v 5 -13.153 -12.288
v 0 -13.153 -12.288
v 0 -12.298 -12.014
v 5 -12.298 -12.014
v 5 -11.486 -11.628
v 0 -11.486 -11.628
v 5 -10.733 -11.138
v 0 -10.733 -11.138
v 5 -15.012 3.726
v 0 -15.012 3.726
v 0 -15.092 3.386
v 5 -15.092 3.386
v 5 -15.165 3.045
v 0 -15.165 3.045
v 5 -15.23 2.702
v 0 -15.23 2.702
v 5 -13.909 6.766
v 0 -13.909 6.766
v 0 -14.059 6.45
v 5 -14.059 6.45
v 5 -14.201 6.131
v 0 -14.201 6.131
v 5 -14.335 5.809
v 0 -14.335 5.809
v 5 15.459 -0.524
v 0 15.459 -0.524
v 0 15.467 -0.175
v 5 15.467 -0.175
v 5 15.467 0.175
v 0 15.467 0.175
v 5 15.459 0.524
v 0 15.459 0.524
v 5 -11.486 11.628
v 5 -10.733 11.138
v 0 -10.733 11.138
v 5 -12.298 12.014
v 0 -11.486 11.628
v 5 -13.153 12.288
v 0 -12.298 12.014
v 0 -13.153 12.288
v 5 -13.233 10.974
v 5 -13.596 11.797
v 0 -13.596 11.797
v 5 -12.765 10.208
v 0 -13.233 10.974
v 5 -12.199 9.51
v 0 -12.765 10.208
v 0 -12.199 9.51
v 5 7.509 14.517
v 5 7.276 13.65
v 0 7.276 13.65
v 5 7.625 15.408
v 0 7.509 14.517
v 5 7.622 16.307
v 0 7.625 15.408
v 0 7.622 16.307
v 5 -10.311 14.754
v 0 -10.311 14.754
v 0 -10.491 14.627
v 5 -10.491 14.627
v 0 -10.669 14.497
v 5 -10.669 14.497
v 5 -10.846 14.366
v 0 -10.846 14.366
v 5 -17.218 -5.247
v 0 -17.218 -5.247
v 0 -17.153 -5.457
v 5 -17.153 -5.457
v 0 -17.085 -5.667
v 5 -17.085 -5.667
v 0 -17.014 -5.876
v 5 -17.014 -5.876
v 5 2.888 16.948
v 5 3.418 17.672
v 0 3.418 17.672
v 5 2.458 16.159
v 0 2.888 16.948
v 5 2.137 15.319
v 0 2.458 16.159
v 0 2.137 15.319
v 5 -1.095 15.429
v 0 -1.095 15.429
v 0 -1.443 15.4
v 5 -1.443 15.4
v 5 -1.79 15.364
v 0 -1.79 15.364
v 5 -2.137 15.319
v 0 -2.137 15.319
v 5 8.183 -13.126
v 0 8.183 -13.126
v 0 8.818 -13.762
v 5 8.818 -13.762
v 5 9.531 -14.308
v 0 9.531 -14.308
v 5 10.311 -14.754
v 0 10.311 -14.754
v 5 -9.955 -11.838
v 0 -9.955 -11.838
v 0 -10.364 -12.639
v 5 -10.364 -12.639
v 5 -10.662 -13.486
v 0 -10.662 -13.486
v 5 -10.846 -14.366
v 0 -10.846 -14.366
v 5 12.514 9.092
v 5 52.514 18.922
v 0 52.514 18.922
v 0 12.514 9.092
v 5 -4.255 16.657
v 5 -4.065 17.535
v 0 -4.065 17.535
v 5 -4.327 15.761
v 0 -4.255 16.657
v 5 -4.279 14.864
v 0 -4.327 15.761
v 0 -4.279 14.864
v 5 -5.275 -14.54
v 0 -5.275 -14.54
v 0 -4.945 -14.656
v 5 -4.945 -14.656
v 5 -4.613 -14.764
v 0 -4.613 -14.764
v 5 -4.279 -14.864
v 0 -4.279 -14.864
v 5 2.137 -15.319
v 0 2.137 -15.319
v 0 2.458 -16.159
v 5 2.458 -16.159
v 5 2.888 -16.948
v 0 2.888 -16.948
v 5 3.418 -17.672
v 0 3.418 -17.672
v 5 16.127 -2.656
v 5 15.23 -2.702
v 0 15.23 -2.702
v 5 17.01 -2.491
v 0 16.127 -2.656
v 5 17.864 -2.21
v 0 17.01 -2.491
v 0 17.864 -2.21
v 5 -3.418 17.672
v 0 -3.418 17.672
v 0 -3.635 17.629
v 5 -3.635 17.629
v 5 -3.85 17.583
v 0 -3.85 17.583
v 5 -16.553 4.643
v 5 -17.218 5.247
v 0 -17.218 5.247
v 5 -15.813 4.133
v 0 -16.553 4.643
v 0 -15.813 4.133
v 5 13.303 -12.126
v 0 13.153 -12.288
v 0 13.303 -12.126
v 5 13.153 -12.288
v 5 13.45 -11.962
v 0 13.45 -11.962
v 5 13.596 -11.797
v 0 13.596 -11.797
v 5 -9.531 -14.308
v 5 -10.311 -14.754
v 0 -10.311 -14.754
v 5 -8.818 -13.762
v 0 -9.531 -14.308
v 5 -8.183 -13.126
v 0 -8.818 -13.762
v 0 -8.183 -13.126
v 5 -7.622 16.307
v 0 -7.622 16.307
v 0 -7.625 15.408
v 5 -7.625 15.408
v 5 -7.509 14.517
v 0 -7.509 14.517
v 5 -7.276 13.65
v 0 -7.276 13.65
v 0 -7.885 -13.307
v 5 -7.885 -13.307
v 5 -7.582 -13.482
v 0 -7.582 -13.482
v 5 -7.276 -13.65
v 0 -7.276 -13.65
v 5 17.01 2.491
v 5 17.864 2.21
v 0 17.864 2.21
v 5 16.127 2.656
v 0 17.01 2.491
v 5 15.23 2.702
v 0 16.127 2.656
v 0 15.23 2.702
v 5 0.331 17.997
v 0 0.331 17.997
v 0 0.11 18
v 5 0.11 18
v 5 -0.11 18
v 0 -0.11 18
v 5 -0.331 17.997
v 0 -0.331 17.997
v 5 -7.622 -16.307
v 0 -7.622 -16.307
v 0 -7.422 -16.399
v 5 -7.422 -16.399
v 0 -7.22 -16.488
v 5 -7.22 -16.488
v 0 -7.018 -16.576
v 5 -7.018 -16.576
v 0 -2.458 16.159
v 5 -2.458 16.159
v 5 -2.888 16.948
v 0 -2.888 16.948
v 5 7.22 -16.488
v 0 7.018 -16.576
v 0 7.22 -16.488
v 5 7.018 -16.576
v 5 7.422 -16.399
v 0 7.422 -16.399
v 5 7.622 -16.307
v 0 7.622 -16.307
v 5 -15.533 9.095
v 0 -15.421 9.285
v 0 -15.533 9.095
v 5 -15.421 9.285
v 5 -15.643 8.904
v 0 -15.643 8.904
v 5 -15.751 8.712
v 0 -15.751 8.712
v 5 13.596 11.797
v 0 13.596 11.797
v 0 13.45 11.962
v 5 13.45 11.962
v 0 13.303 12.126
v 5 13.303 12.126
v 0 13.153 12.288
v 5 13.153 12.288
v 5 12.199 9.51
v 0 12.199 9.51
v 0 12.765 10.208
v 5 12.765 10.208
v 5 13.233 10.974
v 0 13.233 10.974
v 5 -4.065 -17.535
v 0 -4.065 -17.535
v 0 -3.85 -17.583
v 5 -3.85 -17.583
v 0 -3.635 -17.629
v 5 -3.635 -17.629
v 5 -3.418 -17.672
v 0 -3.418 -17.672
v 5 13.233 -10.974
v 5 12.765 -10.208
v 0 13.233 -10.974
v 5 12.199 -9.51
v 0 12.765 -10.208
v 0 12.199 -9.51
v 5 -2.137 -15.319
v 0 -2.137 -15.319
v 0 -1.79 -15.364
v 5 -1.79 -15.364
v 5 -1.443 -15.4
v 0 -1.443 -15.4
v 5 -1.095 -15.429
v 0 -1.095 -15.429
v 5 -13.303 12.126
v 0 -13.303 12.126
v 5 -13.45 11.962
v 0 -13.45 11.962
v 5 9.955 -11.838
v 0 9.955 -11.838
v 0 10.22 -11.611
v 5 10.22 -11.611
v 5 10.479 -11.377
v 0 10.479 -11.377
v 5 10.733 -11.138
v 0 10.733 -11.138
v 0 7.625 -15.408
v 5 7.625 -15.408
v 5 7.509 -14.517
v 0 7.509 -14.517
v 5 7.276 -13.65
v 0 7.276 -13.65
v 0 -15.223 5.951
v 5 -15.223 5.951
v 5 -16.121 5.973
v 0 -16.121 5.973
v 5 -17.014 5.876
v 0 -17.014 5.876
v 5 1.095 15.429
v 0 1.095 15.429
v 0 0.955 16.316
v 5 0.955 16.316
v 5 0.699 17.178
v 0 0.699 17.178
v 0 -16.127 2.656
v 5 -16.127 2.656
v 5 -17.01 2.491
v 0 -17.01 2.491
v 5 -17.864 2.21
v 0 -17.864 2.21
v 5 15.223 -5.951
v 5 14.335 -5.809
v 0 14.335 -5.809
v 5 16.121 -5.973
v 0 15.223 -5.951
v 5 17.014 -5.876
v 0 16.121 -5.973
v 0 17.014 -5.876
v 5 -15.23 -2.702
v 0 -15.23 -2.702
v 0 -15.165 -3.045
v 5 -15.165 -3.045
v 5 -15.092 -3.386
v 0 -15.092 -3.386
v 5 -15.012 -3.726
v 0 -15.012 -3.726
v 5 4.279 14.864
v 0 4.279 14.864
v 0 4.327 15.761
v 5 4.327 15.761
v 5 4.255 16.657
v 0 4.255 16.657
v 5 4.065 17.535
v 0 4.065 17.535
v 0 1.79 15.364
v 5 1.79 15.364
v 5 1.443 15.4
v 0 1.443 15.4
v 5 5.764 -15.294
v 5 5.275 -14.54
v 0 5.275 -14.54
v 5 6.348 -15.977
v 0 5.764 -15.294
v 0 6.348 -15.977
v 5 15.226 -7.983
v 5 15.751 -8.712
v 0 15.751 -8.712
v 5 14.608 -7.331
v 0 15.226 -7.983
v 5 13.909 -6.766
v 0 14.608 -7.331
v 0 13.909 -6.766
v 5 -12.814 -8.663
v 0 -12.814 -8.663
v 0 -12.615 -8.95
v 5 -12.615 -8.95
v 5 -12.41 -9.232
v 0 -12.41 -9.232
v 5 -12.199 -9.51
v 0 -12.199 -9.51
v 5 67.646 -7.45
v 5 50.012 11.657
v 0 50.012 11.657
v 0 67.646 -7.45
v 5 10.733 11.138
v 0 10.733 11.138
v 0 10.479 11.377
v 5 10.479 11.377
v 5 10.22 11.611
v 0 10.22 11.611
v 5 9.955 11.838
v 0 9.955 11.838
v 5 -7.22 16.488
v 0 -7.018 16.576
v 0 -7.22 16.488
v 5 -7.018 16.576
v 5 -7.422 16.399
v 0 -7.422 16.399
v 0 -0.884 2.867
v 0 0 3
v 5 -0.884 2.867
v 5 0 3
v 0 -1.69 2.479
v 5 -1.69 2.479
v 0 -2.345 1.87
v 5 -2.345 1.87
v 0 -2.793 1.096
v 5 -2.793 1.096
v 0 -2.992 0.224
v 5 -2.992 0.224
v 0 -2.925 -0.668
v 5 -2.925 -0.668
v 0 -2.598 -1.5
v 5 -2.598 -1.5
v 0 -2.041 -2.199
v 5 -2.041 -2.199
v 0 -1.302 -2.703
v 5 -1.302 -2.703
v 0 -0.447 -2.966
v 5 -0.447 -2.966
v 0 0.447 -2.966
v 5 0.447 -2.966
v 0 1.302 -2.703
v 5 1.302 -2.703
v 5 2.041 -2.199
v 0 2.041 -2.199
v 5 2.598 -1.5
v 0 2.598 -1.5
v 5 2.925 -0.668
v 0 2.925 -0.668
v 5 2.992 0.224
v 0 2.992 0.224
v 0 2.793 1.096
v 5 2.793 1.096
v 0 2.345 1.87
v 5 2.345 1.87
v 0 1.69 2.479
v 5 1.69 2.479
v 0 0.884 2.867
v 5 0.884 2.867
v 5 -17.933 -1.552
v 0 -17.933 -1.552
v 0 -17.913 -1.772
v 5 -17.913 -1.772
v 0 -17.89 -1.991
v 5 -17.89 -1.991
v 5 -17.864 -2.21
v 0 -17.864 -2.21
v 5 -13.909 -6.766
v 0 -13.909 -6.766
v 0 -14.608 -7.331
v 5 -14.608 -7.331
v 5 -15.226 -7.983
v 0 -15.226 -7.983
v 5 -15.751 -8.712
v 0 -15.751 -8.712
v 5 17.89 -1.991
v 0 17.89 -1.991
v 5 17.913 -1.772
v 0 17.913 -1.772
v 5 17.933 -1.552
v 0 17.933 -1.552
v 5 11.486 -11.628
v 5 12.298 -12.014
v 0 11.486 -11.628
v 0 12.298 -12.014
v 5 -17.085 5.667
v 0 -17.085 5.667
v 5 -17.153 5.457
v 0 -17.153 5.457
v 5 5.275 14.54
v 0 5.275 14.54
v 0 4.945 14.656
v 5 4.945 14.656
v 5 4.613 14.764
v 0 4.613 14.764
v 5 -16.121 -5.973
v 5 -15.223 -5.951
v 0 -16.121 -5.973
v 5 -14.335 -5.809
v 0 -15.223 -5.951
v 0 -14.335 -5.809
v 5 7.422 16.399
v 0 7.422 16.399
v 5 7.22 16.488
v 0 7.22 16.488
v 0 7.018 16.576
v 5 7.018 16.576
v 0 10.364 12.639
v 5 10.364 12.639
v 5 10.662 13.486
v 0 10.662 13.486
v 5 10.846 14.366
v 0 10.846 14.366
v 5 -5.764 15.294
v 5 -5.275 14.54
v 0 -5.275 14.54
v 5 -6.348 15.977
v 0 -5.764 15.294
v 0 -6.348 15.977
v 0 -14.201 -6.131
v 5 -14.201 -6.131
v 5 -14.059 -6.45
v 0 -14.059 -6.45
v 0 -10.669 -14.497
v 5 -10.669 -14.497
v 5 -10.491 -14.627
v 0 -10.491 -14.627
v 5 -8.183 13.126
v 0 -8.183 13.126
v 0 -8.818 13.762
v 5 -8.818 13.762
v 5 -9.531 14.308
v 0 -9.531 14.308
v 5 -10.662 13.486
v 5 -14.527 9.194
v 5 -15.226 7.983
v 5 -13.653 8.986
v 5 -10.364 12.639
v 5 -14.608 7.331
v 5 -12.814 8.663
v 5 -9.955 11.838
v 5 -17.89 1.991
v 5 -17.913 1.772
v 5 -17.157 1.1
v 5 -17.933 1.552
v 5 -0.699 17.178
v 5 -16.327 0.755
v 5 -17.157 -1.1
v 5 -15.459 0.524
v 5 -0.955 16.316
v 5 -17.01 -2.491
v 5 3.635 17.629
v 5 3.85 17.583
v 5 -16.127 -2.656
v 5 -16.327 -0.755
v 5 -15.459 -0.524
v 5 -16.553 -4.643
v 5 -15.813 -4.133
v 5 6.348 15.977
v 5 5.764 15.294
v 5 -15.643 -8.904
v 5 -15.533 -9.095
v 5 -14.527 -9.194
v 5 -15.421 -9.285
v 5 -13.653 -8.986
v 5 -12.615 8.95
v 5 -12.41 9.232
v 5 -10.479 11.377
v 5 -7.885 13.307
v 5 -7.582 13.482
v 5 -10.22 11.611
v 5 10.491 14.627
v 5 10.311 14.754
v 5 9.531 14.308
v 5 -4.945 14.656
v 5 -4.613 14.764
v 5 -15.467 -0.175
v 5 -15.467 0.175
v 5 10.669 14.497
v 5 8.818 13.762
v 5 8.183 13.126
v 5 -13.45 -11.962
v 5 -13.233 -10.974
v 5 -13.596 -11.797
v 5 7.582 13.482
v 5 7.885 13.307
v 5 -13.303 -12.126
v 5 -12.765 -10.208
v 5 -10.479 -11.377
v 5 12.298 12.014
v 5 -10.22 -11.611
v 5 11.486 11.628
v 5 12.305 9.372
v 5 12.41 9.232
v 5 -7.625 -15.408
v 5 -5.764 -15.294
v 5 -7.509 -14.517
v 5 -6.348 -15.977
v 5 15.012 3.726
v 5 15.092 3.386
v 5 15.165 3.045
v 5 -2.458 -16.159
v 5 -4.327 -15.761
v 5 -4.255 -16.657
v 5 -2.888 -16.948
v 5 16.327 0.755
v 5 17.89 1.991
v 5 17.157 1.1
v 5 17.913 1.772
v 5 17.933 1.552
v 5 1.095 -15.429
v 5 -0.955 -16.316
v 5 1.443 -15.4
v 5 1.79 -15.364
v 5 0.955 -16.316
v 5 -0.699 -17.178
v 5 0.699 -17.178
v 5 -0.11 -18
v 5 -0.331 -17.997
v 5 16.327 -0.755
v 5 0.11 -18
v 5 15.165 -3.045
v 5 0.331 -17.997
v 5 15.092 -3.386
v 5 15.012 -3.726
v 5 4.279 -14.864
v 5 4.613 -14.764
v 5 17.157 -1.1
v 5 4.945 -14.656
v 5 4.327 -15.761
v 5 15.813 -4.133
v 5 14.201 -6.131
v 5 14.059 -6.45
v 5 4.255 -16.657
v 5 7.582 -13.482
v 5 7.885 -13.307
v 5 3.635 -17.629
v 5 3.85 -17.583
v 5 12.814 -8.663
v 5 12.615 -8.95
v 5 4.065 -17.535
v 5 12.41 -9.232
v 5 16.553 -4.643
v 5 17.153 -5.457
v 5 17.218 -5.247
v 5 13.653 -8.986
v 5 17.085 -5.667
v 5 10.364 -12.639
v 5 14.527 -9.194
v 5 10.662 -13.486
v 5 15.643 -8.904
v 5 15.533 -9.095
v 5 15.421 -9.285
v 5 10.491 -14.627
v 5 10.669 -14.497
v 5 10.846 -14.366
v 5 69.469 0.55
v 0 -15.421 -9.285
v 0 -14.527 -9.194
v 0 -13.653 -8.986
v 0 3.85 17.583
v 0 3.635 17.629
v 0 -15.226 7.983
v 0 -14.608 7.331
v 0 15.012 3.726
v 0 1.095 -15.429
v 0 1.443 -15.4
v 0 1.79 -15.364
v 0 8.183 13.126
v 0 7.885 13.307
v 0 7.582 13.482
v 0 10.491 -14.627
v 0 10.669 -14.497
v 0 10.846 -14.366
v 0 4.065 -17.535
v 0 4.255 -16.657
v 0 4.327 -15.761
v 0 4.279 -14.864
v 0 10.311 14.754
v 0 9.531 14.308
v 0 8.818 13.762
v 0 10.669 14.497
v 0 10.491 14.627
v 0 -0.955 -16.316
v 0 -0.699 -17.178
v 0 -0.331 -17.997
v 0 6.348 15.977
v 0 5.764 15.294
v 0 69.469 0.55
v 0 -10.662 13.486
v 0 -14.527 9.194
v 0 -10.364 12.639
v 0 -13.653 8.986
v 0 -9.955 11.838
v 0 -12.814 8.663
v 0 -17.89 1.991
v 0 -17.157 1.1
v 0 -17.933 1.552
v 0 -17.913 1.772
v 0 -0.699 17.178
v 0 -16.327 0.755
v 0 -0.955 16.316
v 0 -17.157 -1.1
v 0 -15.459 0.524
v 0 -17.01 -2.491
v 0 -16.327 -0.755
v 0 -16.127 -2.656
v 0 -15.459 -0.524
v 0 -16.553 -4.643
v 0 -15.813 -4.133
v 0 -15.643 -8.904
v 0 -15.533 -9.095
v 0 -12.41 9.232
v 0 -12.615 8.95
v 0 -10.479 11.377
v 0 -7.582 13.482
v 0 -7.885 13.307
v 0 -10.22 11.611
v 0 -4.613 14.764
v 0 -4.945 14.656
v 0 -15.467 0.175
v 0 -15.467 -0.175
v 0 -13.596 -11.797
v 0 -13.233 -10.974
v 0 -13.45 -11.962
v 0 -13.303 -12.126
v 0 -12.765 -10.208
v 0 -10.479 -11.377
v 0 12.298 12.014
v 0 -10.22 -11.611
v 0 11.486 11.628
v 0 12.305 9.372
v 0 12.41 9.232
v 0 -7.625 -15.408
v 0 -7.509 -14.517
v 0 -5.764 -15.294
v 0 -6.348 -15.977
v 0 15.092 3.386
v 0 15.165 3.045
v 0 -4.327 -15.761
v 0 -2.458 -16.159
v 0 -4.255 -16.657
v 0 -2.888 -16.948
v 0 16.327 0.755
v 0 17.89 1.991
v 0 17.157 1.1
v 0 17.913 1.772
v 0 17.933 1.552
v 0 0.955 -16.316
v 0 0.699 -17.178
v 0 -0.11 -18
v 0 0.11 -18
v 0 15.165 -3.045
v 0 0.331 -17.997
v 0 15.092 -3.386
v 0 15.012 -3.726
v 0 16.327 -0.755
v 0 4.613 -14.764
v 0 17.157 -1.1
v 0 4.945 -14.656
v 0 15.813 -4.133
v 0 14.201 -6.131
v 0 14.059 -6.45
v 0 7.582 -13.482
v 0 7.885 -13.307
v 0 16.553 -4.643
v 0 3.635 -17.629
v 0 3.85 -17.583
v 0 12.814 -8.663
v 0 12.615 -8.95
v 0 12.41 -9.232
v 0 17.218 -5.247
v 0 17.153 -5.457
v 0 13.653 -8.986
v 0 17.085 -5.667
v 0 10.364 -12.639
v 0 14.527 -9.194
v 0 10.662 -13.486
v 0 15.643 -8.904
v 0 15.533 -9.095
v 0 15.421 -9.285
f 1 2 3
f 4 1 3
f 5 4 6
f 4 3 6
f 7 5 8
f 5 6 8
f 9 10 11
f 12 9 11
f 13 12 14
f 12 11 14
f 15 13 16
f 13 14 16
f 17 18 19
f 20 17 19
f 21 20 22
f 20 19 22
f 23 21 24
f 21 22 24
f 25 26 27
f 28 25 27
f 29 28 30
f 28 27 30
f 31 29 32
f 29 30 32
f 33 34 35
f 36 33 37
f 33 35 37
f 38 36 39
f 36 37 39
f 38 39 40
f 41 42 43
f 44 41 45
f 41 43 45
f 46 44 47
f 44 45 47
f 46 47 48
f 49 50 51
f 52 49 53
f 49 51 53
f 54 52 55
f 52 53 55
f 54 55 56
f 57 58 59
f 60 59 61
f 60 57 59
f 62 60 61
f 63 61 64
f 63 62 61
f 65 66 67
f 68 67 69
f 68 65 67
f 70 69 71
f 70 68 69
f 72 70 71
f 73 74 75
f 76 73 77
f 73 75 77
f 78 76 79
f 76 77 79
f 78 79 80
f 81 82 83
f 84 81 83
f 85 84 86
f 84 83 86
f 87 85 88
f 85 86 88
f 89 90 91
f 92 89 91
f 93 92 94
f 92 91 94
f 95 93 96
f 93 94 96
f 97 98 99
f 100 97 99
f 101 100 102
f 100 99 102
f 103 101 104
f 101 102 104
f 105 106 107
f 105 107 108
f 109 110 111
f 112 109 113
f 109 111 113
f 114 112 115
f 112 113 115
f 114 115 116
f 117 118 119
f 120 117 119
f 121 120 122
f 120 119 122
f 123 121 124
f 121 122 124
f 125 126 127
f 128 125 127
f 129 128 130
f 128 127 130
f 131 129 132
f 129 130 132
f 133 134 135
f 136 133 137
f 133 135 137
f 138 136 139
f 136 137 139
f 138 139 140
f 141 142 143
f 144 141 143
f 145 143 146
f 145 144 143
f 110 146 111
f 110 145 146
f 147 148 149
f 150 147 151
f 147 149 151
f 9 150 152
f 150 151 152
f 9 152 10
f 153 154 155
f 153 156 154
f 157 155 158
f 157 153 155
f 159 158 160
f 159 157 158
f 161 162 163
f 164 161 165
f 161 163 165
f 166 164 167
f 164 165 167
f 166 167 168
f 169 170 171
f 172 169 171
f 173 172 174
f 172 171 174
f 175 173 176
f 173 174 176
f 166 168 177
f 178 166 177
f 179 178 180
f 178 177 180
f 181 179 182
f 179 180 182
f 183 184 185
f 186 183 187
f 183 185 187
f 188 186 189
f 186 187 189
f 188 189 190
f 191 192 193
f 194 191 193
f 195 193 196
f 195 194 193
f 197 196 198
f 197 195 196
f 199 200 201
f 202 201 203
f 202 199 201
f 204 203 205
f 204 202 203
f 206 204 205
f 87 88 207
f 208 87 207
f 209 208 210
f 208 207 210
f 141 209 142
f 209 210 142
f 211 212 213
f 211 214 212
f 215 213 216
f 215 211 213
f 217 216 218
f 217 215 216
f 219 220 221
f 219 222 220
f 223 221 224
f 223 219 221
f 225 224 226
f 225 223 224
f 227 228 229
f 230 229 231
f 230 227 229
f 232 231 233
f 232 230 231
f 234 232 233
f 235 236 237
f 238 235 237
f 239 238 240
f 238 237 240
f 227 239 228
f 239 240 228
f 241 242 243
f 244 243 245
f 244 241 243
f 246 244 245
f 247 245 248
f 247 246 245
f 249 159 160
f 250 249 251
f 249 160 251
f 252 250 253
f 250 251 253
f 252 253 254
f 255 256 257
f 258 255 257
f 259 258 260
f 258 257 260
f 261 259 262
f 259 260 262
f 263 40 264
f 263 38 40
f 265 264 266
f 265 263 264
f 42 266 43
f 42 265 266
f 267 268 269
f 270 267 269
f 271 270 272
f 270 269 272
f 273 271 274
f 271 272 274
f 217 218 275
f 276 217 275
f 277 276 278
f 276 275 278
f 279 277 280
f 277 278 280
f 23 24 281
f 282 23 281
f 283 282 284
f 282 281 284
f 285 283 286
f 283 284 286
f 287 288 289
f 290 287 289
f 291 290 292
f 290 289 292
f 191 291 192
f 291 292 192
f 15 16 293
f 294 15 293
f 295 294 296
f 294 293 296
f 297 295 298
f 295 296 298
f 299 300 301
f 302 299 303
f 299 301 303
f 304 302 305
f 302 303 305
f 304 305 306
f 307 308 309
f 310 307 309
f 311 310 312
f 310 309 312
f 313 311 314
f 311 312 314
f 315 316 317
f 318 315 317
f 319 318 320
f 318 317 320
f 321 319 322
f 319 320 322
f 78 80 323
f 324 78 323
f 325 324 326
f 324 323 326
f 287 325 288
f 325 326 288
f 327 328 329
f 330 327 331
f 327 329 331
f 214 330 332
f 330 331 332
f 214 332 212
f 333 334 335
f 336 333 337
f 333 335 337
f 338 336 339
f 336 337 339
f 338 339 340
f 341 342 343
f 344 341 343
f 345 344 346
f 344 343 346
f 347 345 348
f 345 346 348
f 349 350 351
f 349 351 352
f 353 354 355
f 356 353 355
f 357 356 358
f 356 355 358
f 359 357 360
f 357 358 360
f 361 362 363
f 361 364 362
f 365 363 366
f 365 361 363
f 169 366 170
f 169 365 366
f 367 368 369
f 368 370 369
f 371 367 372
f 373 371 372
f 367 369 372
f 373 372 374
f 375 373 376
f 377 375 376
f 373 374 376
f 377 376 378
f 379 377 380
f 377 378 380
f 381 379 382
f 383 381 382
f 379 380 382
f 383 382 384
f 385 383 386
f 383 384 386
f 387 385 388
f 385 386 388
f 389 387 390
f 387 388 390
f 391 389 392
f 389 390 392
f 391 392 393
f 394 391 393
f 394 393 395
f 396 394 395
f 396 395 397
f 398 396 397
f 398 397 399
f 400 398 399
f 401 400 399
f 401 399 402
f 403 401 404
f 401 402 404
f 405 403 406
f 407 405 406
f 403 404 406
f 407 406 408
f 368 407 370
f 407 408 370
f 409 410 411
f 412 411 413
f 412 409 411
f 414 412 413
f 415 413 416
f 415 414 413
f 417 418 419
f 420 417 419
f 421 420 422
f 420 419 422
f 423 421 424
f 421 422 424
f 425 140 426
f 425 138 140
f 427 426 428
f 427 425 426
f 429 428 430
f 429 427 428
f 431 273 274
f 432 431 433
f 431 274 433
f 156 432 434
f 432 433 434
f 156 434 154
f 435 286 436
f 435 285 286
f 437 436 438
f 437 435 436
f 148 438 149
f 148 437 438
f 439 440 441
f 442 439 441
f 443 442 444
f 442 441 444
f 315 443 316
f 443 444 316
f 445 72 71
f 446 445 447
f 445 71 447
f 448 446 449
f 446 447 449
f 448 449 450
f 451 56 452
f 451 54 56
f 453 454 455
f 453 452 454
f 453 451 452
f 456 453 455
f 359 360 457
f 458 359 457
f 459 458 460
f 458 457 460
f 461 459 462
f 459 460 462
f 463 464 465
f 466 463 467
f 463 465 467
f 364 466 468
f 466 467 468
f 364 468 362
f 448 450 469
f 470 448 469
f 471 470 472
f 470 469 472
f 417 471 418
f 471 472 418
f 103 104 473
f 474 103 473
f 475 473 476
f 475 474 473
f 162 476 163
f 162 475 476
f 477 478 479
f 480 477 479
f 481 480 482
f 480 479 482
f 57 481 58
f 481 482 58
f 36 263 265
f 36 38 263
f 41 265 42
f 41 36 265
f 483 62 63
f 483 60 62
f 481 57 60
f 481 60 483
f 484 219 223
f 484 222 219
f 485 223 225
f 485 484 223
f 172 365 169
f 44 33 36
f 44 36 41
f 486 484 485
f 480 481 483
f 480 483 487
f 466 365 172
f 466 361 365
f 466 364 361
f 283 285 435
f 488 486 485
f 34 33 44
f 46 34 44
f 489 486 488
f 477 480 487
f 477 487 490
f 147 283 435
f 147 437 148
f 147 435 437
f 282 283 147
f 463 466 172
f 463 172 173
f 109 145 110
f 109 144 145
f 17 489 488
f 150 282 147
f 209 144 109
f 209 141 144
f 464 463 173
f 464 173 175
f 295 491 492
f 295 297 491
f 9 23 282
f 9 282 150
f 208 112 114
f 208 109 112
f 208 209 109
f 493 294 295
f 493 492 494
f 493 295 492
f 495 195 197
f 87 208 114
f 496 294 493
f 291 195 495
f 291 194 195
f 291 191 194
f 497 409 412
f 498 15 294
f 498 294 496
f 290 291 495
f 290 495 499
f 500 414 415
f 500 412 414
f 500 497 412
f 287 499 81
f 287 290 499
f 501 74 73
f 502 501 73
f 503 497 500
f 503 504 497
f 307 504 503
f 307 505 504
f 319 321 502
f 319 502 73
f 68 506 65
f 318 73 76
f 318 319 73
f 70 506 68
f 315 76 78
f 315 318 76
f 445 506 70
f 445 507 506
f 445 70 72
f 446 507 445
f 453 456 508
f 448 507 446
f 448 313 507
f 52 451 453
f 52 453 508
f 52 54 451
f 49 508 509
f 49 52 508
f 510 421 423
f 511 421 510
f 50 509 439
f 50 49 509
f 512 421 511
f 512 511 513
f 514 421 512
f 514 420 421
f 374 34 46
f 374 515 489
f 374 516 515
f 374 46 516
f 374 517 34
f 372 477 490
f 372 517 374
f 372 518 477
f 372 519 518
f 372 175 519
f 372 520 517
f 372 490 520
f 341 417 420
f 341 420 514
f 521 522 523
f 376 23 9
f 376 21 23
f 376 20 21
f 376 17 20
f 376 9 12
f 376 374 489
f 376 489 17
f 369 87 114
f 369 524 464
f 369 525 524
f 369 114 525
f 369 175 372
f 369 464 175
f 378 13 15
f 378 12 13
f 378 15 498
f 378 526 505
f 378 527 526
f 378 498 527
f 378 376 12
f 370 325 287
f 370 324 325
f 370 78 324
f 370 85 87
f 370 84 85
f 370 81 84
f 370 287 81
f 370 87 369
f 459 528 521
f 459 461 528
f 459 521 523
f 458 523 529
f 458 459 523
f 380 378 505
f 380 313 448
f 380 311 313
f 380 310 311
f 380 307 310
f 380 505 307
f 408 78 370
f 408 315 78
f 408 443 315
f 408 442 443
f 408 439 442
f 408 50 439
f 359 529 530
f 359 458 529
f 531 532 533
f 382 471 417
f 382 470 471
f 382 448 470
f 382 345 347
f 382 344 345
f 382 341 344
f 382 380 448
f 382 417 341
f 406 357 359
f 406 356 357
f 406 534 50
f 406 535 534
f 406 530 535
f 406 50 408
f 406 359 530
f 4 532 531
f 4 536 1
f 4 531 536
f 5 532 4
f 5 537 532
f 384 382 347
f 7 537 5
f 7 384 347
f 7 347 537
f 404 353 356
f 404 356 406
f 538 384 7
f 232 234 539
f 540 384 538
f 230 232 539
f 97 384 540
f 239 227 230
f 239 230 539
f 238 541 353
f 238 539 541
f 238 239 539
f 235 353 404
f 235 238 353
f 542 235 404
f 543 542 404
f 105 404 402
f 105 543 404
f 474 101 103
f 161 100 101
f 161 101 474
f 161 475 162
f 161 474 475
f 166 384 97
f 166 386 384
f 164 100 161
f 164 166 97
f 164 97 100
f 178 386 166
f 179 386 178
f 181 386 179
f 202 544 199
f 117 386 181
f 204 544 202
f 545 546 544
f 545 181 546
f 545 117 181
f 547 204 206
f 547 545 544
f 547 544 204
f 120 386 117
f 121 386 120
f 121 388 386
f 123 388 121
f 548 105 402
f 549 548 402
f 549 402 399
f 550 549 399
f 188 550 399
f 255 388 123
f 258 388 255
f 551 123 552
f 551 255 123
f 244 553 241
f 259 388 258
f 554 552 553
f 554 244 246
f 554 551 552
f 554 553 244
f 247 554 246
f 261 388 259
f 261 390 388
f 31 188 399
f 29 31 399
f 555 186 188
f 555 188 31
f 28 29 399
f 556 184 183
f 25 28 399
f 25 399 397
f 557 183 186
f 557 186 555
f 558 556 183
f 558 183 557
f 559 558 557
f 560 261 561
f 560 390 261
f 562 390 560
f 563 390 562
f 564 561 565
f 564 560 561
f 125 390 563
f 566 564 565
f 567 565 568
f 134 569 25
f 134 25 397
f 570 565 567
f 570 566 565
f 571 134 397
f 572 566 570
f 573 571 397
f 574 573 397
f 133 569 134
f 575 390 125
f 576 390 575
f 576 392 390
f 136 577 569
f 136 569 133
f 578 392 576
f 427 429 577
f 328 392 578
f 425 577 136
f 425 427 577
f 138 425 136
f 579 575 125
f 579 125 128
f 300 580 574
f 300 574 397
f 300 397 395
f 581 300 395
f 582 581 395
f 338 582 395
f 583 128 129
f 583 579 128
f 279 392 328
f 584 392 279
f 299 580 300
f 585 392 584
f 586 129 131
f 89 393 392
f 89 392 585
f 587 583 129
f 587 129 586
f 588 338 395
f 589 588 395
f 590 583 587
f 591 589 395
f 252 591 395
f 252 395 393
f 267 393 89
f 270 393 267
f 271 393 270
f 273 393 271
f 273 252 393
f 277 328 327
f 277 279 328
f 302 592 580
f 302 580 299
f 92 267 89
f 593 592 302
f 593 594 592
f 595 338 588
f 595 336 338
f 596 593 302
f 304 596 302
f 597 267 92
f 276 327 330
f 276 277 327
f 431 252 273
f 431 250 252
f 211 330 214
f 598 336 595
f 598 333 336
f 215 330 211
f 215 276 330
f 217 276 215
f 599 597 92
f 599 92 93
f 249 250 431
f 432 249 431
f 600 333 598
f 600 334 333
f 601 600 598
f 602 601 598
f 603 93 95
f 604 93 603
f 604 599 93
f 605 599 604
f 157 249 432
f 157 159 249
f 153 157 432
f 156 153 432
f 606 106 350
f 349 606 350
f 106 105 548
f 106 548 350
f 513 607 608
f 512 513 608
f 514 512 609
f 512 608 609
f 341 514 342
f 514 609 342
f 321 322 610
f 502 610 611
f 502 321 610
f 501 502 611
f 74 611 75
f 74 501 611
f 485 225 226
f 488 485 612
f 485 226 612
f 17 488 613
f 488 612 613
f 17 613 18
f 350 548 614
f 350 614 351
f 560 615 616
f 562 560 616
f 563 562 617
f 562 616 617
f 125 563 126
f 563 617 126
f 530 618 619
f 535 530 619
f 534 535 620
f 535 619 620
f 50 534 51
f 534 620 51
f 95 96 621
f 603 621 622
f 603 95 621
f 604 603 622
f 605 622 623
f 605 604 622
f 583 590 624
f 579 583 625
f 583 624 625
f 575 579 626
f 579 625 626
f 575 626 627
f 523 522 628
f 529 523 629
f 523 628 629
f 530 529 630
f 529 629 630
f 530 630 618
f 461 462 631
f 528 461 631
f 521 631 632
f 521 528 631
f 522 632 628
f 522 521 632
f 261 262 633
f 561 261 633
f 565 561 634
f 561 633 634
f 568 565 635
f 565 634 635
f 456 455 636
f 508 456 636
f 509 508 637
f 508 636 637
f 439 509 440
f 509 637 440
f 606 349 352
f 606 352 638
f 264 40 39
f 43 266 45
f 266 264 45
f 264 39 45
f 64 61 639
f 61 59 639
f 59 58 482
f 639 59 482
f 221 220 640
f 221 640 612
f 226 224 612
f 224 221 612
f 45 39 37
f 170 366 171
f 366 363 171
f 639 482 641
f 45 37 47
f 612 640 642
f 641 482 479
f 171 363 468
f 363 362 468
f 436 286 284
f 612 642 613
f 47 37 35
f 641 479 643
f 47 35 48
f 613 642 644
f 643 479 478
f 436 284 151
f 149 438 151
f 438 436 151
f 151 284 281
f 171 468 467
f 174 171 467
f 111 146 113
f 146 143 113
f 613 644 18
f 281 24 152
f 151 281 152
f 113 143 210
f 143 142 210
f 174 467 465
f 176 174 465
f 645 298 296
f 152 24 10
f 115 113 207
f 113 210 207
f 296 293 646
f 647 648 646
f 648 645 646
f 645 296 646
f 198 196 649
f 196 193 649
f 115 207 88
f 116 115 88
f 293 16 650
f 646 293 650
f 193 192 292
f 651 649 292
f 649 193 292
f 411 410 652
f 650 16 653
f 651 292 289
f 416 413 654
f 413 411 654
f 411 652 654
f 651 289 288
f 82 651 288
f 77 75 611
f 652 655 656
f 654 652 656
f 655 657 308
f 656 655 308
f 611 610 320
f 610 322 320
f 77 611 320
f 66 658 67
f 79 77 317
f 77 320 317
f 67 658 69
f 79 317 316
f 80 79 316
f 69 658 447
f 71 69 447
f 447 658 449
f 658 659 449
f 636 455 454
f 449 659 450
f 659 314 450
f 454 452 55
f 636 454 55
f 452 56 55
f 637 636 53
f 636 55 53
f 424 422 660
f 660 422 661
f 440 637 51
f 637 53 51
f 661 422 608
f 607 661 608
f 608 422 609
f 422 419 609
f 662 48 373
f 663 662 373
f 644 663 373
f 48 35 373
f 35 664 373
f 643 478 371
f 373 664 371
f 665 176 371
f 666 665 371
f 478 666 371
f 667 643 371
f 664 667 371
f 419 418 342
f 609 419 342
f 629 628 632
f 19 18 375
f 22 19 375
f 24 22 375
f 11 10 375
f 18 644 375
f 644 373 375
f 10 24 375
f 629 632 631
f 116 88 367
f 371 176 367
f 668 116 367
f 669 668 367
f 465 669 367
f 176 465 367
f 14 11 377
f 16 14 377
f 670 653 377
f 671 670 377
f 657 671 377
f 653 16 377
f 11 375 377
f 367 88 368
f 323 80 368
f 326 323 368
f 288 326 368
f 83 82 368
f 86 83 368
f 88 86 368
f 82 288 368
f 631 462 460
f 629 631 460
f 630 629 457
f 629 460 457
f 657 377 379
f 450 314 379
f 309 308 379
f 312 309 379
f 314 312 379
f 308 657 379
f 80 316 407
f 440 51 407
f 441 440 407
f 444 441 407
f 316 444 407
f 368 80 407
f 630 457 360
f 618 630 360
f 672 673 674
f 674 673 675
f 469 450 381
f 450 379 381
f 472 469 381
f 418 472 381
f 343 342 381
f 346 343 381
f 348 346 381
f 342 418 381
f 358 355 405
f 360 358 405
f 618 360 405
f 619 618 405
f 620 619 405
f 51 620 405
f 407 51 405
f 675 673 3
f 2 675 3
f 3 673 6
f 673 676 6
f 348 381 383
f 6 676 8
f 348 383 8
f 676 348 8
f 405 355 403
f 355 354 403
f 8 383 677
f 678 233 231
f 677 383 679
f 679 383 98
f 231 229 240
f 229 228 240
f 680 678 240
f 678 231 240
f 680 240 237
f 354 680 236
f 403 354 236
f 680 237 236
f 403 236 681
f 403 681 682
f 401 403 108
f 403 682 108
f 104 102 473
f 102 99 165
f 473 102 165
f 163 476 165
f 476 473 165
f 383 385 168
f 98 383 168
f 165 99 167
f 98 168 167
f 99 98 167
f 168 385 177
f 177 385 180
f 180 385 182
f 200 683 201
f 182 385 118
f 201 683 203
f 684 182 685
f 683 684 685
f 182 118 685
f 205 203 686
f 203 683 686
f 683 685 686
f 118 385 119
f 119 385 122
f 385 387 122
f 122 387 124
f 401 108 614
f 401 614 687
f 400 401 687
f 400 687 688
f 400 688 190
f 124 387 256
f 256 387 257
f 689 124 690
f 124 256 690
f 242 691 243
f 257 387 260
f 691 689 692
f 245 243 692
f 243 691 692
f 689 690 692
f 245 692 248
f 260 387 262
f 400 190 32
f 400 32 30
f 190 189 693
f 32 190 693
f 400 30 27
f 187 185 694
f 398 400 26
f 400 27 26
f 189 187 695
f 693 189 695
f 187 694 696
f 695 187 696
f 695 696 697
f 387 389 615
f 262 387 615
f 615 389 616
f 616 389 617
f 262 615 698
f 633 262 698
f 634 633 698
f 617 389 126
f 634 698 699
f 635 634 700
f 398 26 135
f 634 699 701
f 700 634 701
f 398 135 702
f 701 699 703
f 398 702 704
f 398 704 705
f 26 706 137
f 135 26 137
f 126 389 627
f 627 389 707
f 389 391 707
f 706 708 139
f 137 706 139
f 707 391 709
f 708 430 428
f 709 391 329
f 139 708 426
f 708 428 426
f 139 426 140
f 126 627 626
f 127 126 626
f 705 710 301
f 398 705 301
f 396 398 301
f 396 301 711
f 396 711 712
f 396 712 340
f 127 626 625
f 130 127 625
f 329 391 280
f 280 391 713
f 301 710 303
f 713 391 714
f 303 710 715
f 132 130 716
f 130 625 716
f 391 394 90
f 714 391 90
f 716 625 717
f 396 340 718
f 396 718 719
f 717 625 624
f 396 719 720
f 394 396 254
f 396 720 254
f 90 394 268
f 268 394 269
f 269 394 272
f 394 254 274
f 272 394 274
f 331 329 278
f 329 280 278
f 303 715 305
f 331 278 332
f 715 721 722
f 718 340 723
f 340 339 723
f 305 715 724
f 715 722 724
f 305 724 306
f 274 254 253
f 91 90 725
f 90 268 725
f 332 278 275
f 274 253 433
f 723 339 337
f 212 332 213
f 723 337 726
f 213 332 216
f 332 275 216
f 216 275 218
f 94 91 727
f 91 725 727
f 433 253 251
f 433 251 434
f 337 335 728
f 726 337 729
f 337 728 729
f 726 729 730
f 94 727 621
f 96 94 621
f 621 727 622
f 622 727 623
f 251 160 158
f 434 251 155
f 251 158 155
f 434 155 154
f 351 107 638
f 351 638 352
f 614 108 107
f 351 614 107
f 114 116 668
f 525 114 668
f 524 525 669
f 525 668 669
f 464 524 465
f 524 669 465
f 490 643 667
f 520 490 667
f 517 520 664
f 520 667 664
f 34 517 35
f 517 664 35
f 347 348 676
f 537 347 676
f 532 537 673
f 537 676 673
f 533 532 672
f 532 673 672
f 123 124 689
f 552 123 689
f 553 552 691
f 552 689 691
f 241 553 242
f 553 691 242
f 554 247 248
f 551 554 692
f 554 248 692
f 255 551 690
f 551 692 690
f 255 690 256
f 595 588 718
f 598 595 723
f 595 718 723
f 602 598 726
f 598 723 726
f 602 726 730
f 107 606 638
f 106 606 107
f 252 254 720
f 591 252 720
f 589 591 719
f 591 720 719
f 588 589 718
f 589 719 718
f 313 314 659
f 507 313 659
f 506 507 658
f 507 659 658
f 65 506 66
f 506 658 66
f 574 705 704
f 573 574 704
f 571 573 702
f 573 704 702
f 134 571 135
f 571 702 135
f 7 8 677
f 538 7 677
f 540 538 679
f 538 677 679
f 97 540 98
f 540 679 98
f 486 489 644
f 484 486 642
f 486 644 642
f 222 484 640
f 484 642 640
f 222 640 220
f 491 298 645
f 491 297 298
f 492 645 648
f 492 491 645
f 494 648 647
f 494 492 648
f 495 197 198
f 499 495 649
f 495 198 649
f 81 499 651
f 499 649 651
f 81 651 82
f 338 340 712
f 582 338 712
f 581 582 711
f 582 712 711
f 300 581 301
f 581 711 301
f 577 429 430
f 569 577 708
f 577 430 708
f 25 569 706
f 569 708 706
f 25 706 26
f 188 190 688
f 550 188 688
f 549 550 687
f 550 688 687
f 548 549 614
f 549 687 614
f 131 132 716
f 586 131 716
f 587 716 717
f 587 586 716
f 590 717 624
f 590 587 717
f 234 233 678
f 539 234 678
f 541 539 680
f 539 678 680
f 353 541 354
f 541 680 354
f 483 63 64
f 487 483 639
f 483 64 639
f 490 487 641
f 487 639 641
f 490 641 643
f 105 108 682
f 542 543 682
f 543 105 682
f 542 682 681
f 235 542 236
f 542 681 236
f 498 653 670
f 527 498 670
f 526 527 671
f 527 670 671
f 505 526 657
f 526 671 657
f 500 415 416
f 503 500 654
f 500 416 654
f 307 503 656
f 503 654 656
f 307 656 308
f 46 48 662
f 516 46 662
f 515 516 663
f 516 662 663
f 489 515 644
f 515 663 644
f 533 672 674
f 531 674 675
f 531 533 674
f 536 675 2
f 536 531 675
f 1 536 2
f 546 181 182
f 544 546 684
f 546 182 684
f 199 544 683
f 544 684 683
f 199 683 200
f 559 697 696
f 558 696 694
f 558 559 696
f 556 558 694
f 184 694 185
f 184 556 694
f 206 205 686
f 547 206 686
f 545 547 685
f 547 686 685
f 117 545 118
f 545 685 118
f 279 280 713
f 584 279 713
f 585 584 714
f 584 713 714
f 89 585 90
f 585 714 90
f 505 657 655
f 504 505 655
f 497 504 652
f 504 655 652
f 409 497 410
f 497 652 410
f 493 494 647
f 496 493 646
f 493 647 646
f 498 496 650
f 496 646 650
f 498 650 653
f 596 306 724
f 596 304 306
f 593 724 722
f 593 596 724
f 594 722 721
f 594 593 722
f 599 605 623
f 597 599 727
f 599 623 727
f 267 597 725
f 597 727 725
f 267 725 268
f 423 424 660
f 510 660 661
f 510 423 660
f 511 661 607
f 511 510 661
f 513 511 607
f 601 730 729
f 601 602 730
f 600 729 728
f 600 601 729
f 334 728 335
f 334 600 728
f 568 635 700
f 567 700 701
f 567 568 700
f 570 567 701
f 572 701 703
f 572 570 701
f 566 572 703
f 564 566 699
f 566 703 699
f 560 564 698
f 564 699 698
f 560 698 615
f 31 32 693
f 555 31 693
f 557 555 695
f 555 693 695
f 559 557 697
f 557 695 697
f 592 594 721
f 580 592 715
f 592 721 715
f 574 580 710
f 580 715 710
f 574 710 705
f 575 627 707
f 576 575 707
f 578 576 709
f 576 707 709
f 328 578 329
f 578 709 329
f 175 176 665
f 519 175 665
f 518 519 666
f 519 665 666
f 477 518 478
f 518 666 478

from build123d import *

# Parameters (mm, degrees)
BASPROSKE_W        = 5
BASPROSKE_H        = 18
TOOTHCUT_DEPTH     = 26.942243542
TEETHCUTS_COUNT    = 30
BORSKE_R           = 3
BORE_DEPTH         = 50.0000508
BOSS_EXTRU_1_DEPTH = 5


with BuildPart() as part:
    # BasProSke → Base-Revolve (revolve)
    with BuildSketch(Plane(origin=(0, 0, 0), x_dir=(1, 0, 0), z_dir=(0, 1, 0)), mode=Mode.PRIVATE) as base_revolve_sk:
        with Locations((2.5, 9)):
            Rectangle(BASPROSKE_W, BASPROSKE_H)
    revolve(base_revolve_sk.sketch.rotate(Axis((-10, 0, 0), (1, 0, 0)), 180), axis=Axis((-10, 0, 0), (1, 0, 0)))

    # TooCutSke → ToothCut (cut, through all)
    with BuildSketch(Plane(origin=(0, 0, 0), x_dir=(0, 0, -1), z_dir=(1, 0, 0))):
        with BuildLine():
            ThreePointArc((0.523521522, 15.458887906), (0, 15.46775), (-0.523521522, 15.458887906))
            ThreePointArc((-0.523521522, 15.458887906), (-0.919551256, 16.760900189), (-1.568701479, 17.957010353))
            ThreePointArc((-1.568701479, 17.957010353), (0, 18.0254), (1.568701479, 17.957010353))
            ThreePointArc((1.568701479, 17.957010353), (0.919551256, 16.760900189), (0.523521522, 15.458887906))
        make_face()
    toothcut = extrude(amount=TOOTHCUT_DEPTH, mode=Mode.SUBTRACT)

    # TeethCuts: ToothCut ×30 about axis
    teethcuts_axis = Axis((0, 0, 0), (1, 0, 0))
    for i in range(1, TEETHCUTS_COUNT):
        add(toothcut.rotate(teethcuts_axis, i * 360 / TEETHCUTS_COUNT), mode=Mode.SUBTRACT)

    # BorSke → Bore (cut, symmetric)
    with BuildSketch(Plane(origin=(0, 0, 0), x_dir=(0, 0, -1), z_dir=(1, 0, 0))):
        with Locations(Location((0, 0, 0), (0, 0, 180))):
            Circle(BORSKE_R)
    extrude(amount=BORE_DEPTH, both=True, mode=Mode.SUBTRACT)

    # Esquisse2 → Boss.-Extru.1 (add)
    with BuildSketch(Plane(origin=(5, 0, 0), x_dir=(0, 0, -1), z_dir=(1, 0, 0))):
        Polygon((-3.726164843, 15.01222787), (-11.656542396, 50.01222787), (7.45003198, 67.64568515), (-0.54996802, 69.468919999), (-18.921674151, 52.513672615), (-9.091715336, 12.513672615), align=None)
    extrude(amount=-BOSS_EXTRU_1_DEPTH)


solid = part.part
